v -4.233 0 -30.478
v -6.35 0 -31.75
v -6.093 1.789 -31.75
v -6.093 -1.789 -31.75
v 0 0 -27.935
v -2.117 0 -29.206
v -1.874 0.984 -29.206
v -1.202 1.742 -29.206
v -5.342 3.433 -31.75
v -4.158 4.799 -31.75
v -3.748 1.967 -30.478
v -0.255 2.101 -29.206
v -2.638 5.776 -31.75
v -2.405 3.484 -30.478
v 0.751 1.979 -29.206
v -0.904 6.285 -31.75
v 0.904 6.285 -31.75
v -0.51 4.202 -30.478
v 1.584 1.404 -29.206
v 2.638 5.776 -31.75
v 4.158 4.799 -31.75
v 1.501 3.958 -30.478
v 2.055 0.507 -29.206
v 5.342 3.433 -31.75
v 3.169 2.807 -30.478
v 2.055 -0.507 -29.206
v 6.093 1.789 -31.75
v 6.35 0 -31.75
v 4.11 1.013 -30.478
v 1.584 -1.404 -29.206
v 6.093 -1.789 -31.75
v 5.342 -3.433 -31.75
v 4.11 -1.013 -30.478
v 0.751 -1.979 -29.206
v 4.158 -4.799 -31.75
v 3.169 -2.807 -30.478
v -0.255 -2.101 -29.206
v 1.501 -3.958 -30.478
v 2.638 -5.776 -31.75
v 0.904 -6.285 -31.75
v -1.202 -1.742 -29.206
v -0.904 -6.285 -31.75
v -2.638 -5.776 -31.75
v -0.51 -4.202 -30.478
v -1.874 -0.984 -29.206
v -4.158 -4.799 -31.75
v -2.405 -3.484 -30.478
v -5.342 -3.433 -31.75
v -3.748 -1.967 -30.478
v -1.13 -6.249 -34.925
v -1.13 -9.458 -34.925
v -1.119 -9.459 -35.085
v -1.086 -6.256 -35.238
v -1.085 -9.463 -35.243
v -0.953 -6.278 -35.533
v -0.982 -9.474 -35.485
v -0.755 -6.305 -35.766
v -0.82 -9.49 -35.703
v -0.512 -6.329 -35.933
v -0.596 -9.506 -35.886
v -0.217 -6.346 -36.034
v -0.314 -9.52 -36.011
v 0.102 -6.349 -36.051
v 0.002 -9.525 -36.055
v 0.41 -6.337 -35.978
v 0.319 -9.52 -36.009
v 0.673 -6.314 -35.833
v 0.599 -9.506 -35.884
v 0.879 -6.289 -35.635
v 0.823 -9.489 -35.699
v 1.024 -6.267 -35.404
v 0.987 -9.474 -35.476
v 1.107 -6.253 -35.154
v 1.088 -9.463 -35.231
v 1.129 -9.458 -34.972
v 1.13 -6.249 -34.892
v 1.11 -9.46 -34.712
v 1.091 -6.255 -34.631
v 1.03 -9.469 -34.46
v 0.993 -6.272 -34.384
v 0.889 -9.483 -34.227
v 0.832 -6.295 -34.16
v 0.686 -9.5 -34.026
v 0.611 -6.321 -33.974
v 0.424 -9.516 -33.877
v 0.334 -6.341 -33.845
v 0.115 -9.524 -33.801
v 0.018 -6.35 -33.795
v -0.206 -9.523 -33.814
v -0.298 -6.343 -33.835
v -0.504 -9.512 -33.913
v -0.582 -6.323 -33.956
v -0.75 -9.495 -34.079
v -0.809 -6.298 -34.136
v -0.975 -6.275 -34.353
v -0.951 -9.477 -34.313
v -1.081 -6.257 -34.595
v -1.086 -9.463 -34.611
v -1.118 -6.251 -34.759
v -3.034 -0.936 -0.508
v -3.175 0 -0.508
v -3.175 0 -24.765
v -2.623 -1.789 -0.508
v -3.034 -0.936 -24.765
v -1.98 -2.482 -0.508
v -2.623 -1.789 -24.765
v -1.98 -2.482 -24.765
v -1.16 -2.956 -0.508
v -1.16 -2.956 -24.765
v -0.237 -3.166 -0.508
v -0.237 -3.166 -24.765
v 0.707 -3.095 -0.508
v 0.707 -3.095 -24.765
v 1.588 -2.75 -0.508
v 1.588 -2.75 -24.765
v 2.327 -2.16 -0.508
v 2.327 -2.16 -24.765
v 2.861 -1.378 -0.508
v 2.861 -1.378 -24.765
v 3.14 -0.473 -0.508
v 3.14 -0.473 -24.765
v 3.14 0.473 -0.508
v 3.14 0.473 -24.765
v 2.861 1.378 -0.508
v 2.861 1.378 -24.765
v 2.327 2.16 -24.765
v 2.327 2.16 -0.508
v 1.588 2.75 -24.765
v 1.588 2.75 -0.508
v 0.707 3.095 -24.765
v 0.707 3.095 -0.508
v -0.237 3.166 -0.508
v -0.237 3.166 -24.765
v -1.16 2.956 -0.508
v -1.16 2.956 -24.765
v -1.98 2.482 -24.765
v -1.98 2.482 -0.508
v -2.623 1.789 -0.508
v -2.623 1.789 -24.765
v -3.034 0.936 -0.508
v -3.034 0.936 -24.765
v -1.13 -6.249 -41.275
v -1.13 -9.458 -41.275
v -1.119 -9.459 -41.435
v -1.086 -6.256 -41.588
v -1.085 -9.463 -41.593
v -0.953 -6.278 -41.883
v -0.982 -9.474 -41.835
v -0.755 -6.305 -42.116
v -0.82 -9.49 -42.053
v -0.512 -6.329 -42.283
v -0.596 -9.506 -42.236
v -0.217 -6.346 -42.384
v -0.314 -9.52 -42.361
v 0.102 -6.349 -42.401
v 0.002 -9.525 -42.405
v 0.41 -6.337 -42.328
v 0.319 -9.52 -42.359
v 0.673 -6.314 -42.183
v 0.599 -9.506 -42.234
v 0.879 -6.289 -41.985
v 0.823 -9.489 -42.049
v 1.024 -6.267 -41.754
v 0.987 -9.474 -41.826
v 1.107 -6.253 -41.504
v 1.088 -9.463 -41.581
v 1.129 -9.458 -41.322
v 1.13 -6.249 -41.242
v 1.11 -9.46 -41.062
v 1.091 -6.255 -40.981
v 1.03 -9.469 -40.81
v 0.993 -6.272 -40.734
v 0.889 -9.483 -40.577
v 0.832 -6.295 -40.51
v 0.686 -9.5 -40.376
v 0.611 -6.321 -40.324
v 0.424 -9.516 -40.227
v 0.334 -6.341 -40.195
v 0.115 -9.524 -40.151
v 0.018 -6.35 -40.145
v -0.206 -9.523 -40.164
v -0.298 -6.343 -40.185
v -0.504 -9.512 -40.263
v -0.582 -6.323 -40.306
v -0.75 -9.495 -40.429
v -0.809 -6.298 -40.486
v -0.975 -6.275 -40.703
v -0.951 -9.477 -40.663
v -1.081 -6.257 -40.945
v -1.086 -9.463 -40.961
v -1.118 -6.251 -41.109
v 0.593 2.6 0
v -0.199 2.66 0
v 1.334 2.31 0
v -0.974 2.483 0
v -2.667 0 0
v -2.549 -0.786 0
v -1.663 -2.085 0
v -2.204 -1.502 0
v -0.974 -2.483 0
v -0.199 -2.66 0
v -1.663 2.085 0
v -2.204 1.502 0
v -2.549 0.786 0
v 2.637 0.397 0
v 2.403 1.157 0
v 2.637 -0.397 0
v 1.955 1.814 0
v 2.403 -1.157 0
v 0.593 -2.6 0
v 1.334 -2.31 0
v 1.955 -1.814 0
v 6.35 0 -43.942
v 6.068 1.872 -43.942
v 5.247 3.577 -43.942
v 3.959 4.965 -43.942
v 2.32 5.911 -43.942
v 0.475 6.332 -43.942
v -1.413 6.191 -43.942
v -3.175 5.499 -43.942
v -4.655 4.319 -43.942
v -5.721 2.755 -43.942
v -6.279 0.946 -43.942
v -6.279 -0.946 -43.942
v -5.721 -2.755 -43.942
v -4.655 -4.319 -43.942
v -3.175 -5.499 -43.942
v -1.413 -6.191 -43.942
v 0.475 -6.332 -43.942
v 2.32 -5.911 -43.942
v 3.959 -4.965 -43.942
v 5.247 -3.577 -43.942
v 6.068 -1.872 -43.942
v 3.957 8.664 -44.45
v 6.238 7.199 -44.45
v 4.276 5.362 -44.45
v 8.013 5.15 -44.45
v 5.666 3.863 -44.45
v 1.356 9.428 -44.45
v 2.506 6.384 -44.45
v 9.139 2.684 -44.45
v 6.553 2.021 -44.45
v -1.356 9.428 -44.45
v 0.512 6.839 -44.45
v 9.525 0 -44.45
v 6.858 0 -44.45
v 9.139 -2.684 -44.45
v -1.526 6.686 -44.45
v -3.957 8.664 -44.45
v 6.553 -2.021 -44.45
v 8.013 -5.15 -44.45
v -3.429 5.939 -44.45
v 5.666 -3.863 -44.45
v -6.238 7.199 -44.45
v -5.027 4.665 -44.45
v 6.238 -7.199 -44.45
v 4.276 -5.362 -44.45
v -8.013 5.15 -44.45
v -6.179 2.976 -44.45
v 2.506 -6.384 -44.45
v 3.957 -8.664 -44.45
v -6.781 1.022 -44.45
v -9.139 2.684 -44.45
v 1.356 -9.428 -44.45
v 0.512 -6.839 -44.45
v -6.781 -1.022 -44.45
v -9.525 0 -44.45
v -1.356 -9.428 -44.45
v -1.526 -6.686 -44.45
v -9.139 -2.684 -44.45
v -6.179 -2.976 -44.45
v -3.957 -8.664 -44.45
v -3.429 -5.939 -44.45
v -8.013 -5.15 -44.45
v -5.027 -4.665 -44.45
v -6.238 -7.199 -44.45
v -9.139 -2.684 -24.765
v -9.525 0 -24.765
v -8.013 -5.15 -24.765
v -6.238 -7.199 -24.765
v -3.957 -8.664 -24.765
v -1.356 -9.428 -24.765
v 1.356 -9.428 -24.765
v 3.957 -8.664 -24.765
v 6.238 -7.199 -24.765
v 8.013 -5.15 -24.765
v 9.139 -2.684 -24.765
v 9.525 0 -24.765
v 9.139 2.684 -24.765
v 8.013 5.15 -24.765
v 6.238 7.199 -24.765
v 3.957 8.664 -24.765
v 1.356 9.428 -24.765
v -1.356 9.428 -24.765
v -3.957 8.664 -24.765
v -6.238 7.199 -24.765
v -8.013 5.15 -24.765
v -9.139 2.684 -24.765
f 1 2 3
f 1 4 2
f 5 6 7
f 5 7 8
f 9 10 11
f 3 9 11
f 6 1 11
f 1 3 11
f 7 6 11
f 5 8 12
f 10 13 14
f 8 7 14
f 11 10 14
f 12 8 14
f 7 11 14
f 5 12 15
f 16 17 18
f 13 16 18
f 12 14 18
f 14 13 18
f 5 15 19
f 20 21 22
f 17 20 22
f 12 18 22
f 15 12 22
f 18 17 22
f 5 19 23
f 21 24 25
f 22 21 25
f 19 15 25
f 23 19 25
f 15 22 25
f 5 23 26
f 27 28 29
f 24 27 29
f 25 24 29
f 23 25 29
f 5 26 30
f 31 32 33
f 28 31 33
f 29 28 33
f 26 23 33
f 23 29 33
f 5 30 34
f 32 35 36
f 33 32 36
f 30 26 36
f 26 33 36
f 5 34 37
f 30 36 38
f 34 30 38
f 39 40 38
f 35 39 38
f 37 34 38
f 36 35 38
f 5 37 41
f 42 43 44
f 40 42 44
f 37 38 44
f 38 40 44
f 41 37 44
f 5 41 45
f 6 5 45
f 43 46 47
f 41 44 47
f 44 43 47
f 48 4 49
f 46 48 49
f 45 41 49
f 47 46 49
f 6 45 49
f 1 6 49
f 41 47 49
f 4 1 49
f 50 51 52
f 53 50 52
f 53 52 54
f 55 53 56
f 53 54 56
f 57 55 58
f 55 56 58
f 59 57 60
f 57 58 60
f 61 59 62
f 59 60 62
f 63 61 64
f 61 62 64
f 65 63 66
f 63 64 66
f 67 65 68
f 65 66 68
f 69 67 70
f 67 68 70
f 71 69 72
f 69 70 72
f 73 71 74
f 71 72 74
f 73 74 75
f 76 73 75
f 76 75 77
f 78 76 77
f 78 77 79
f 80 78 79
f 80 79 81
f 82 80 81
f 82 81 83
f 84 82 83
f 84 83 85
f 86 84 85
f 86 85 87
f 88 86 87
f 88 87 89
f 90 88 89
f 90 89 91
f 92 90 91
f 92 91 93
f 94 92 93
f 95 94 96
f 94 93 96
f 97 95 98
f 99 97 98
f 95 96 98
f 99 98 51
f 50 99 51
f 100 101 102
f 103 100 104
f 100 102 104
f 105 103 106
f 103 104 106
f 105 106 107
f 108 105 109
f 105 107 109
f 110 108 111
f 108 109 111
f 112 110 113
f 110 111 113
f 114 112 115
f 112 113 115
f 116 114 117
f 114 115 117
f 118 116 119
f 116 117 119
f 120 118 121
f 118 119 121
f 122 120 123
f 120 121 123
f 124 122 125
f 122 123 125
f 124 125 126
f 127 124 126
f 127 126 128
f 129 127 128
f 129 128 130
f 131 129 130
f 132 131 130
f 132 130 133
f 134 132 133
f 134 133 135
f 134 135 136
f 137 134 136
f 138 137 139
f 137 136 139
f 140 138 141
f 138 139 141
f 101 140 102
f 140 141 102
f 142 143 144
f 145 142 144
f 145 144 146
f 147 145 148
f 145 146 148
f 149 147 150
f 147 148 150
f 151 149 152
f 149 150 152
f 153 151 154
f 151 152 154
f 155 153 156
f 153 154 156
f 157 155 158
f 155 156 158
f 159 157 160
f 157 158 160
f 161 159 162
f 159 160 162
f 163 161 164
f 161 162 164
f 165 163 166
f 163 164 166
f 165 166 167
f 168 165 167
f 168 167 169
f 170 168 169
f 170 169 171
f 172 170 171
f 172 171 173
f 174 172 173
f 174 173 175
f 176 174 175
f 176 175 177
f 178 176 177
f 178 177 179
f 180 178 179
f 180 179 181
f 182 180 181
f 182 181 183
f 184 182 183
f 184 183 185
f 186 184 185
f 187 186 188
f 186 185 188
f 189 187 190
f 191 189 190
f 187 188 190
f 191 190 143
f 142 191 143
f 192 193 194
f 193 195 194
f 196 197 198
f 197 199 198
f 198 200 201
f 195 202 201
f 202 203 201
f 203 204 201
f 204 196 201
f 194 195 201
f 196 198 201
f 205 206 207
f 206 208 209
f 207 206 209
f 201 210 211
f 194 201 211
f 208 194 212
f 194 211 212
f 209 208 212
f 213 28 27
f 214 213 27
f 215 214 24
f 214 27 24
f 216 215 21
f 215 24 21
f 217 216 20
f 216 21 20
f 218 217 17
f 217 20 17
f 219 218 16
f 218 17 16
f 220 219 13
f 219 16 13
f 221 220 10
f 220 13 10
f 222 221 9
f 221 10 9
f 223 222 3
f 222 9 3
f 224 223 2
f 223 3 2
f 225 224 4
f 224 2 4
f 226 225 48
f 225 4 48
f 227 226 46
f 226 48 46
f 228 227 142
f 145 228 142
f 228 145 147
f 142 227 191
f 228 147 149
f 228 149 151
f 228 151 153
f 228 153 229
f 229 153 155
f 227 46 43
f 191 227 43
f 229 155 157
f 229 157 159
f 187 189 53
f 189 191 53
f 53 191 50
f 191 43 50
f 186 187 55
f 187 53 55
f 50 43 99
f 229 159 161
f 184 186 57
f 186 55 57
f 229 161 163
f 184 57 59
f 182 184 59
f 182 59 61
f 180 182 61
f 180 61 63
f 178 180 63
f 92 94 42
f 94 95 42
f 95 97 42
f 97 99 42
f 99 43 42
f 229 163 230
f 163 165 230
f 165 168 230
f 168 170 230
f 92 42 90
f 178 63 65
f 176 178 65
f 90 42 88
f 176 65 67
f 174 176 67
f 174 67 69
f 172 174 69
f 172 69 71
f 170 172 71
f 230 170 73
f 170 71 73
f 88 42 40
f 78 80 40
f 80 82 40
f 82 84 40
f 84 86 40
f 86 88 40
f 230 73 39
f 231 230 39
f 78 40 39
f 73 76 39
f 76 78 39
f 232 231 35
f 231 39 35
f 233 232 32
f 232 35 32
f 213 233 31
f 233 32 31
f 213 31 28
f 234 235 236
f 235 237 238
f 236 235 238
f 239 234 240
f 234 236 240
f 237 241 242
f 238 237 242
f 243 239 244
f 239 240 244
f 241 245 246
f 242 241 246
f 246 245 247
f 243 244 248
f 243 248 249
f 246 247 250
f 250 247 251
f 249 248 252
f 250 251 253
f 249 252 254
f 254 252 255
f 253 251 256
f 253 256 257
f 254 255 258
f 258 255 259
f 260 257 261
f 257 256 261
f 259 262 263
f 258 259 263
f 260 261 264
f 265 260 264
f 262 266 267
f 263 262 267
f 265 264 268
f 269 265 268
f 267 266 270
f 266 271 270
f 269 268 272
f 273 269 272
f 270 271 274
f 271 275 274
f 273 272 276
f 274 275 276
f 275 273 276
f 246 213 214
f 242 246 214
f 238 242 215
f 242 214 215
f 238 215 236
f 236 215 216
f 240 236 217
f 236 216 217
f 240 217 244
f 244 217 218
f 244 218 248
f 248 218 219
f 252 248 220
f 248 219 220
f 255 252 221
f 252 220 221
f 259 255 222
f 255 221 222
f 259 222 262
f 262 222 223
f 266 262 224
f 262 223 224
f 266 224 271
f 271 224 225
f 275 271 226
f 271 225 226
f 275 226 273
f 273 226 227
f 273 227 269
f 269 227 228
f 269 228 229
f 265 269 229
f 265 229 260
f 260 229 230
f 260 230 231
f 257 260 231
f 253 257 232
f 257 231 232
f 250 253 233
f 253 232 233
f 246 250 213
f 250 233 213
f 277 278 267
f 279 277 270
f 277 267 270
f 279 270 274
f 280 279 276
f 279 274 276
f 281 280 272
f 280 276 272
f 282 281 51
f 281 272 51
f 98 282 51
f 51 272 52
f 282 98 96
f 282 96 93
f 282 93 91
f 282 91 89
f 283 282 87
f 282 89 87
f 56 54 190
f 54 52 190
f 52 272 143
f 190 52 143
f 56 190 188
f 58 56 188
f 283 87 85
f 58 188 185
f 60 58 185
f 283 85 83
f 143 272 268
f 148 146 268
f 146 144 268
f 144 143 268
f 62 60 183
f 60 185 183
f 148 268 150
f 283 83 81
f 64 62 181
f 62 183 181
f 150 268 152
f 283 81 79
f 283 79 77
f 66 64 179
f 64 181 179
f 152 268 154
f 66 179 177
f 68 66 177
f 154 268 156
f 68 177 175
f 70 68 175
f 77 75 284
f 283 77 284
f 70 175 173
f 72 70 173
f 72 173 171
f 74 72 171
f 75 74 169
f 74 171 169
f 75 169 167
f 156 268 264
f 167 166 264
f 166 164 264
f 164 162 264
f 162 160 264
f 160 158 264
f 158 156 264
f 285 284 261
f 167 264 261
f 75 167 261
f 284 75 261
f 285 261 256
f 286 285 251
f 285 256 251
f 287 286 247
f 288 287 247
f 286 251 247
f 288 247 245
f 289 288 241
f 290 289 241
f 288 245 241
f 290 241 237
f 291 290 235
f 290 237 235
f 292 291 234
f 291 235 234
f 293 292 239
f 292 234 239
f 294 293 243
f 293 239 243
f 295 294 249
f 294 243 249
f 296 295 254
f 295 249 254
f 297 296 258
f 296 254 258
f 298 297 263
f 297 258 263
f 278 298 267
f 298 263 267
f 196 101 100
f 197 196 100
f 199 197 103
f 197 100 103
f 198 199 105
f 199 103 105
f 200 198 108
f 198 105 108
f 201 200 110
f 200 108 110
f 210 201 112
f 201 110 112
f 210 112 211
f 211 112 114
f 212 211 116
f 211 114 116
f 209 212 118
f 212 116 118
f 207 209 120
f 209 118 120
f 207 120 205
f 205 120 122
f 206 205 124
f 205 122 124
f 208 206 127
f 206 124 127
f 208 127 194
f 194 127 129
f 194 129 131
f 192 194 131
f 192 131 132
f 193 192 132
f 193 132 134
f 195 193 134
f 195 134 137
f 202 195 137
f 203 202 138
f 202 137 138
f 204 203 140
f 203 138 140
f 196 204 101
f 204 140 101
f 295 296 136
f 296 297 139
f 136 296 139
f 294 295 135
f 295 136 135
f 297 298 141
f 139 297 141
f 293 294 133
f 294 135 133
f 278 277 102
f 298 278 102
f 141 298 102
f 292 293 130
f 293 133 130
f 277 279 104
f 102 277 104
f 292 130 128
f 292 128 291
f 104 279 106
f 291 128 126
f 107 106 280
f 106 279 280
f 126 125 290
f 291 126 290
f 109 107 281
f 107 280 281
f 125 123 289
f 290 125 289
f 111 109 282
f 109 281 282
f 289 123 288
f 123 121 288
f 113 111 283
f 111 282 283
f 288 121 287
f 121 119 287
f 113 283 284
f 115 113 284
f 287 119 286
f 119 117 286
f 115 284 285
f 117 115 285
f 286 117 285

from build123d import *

# Parameters (mm, degrees)
F_1_2_0_5_DIAMETER_HOLE2_D     = 12.7
F_1_2_0_5_DIAMETER_HOLE2_DEPTH = 12.7
F_1_2_0_5_DIAMETER_HOLE2_TIP   = 3.815464931
F_4_40_TAPPED_HOLE1_REACH      = 51.289
F_4_40_TAPPED_HOLE1_BORE_R     = 1.1303
CHAMFER1_SIZE                  = 0.508


with BuildPart() as part:
    # Sketch → Shaft (revolve)
    with BuildSketch(Plane(origin=(0, 0, 0), x_dir=(0, 0, -1), z_dir=(1, 0, 0)), mode=Mode.PRIVATE) as shaft_sk:
        Polygon((0, 0), (0, 3.175), (24.765, 3.175), (24.765, 9.525), (44.45, 9.525), (44.45, 0), align=None)
    revolve(shaft_sk.sketch.rotate(Axis((0, 0, -44.45), (0, 0, 1)), 90), axis=Axis((0, 0, -44.45), (0, 0, 1)))

    # 1/2 (0.5) Diameter Hole2
    with Locations(Plane(origin=(0, 0, -44.45), x_dir=(-1, 0, 0), z_dir=(0, 0, -1))):
        with Locations((0, 0)):
            Hole(F_1_2_0_5_DIAMETER_HOLE2_D / 2, depth=F_1_2_0_5_DIAMETER_HOLE2_DEPTH)
            with Locations((0, 0, -(F_1_2_0_5_DIAMETER_HOLE2_DEPTH + F_1_2_0_5_DIAMETER_HOLE2_TIP / 2))):  # 118° drill point
                Cone(0, F_1_2_0_5_DIAMETER_HOLE2_D / 2, F_1_2_0_5_DIAMETER_HOLE2_TIP, mode=Mode.SUBTRACT)

    # #4-40 Tapped Hole1 bore → #4-40 Tapped Hole1 (cut, up to next)
    with BuildSketch(Plane(origin=(0, -9.525, 0), x_dir=(-1, 0, 0), z_dir=(0, -1, 0)), mode=Mode.PRIVATE) as f_4_40_tapped_hole1_sk1:
        with Locations((0, 34.925)):
            Circle(F_4_40_TAPPED_HOLE1_BORE_R)
    f_4_40_tapped_hole1_tool1 = extrude(f_4_40_tapped_hole1_sk1.sketch, amount=-F_4_40_TAPPED_HOLE1_REACH, mode=Mode.PRIVATE) & part.part
    # #4-40 Tapped Hole1 bore → #4-40 Tapped Hole1 (cut, up to next)
    with BuildSketch(Plane(origin=(0, -9.525, 0), x_dir=(-1, 0, 0), z_dir=(0, -1, 0)), mode=Mode.PRIVATE) as f_4_40_tapped_hole1_sk2:
        with Locations((0, 41.275)):
            Circle(F_4_40_TAPPED_HOLE1_BORE_R)
    f_4_40_tapped_hole1_tool2 = extrude(f_4_40_tapped_hole1_sk2.sketch, amount=-F_4_40_TAPPED_HOLE1_REACH, mode=Mode.PRIVATE) & part.part
    add(f_4_40_tapped_hole1_tool1.solids().sort_by_distance((0, -9.525, -34.925))[0], mode=Mode.SUBTRACT)
    add(f_4_40_tapped_hole1_tool2.solids().sort_by_distance((0, -9.525, -41.275))[0], mode=Mode.SUBTRACT)

    # Chamfer1
    chamfer1_edges = [part.edges().sort_by_distance(p)[0] for p in [
        (-6.35, 0, -44.45),
        (3.175, 0, 0),
    ]]
    chamfer(chamfer1_edges, length=CHAMFER1_SIZE)


solid = part.part
